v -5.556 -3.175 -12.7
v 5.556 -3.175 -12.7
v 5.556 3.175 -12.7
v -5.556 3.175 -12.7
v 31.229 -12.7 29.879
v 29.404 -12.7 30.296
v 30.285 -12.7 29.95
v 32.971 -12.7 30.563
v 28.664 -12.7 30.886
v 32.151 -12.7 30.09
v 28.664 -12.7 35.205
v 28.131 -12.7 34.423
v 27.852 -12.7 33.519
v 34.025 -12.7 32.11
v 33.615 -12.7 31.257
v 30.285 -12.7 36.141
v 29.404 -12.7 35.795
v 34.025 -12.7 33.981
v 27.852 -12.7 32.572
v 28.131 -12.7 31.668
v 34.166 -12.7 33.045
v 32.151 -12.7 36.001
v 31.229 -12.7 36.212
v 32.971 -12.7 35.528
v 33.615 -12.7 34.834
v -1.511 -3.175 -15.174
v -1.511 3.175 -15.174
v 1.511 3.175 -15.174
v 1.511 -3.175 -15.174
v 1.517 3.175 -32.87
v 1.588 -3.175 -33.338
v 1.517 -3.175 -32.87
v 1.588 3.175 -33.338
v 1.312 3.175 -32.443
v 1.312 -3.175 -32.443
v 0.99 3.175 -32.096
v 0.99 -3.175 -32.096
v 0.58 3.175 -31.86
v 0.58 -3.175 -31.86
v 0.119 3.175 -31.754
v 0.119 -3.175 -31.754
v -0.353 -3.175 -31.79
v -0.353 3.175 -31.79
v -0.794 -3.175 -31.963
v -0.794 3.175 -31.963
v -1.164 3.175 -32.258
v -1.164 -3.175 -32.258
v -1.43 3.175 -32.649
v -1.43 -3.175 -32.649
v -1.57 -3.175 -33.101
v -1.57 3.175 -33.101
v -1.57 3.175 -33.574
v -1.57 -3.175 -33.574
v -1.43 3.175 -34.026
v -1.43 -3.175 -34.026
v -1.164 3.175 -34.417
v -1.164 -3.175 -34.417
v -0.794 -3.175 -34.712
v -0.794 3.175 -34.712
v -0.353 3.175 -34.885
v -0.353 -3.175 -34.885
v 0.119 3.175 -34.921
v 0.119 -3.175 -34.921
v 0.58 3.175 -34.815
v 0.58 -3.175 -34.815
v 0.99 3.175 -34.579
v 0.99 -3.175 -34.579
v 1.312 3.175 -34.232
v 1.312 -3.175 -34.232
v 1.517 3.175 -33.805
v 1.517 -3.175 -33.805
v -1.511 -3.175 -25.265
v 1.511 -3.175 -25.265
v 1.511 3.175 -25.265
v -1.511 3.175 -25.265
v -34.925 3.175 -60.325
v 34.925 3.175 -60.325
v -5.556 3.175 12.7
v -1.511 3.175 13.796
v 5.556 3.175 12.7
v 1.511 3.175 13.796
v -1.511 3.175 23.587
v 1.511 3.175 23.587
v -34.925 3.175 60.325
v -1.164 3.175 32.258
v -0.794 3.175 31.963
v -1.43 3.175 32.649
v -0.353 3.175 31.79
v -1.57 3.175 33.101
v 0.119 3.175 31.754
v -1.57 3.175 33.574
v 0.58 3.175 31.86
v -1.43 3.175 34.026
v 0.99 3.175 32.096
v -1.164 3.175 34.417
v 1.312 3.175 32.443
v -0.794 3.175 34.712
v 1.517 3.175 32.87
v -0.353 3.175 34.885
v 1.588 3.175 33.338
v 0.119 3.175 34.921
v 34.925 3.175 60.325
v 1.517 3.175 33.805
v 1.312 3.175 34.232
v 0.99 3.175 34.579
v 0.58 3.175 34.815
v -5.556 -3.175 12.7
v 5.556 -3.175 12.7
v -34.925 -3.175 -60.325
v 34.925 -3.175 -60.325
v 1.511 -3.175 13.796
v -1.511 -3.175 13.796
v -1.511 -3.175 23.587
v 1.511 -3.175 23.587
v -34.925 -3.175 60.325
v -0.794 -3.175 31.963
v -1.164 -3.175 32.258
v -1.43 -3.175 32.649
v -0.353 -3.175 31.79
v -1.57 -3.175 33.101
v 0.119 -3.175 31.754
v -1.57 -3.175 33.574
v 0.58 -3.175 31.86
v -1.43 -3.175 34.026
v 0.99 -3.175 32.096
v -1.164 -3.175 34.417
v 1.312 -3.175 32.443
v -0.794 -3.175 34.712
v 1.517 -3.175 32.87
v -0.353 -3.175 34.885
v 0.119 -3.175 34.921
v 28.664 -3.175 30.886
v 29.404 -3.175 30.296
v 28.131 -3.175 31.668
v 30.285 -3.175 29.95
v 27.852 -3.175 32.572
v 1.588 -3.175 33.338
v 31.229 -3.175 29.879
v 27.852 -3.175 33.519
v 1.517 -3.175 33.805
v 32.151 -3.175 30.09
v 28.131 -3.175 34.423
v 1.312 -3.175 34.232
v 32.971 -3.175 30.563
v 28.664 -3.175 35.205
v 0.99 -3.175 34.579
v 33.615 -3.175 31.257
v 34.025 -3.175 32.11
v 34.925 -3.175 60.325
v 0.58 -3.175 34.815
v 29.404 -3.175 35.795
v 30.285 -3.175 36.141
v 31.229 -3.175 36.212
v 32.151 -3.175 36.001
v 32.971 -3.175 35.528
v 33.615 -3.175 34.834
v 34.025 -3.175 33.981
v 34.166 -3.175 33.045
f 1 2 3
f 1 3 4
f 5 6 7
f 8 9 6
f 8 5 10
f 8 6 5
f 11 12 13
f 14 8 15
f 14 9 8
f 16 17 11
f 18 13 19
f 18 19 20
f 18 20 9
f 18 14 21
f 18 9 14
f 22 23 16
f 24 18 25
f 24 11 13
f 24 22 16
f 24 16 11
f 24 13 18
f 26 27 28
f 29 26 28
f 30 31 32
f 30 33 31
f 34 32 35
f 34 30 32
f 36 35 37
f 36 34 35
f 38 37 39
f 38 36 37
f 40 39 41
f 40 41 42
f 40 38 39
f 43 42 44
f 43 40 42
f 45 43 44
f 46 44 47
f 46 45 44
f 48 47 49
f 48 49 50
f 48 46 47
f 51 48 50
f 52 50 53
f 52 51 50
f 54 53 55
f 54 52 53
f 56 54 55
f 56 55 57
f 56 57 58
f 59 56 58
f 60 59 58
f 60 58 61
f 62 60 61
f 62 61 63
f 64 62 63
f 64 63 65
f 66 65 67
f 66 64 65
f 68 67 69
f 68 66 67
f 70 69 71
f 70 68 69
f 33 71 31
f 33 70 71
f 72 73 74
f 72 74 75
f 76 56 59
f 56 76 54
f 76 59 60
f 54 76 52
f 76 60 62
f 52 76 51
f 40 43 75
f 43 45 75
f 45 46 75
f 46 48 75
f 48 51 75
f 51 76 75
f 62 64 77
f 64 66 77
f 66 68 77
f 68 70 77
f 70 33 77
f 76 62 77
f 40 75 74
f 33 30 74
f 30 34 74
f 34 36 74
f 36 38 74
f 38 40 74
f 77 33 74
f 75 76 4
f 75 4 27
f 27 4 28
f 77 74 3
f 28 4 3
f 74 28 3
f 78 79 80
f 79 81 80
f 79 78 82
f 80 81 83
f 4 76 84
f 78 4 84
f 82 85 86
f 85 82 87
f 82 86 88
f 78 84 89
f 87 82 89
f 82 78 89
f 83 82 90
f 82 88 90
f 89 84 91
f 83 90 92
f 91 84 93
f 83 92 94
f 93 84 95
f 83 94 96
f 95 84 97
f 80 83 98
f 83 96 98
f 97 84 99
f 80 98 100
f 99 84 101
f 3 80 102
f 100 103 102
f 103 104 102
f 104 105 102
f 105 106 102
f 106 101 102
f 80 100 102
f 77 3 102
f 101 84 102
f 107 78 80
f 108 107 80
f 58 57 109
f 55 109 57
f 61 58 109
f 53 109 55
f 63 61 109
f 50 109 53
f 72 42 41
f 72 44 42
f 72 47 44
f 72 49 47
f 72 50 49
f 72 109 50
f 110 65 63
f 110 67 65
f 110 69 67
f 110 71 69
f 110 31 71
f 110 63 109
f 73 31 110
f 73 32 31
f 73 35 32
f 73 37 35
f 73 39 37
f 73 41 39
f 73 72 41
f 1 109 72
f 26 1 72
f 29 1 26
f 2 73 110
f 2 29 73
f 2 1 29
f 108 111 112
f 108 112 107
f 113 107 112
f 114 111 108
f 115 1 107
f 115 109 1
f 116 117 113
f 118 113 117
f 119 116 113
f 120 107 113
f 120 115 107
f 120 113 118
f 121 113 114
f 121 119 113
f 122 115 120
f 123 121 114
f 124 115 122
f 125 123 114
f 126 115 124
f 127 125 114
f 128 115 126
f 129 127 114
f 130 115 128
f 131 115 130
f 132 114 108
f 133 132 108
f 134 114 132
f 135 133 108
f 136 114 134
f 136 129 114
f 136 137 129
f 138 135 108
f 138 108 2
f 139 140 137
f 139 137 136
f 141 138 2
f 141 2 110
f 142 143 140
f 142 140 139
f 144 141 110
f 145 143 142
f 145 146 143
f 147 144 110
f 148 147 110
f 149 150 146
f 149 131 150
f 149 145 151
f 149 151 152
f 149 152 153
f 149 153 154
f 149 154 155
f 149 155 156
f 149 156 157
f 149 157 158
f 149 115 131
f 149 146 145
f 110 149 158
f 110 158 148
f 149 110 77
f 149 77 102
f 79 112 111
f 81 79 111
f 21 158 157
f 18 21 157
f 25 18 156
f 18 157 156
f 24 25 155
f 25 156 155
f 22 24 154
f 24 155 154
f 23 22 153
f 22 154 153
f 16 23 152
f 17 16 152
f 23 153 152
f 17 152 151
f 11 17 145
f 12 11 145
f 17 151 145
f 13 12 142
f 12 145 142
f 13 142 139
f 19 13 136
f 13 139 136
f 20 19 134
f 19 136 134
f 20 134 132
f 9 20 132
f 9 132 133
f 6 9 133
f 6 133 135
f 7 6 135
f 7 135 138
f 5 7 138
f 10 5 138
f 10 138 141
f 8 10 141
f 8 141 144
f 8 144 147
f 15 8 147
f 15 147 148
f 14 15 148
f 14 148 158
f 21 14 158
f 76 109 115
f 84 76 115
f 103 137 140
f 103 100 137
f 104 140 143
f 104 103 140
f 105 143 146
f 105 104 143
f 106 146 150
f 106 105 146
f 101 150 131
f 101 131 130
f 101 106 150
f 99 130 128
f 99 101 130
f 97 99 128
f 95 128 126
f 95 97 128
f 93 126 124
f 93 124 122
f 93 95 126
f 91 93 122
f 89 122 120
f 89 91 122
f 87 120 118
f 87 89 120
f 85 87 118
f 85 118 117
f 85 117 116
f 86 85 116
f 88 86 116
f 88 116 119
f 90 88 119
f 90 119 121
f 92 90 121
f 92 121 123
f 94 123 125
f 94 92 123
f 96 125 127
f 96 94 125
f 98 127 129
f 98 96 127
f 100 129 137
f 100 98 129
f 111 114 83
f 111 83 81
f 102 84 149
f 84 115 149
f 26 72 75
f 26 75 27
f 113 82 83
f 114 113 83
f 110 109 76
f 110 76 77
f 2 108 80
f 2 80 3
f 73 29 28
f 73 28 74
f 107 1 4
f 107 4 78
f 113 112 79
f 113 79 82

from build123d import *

# Parameters (mm, degrees)
F0_R     = 3.175
F1_DEPTH = 12.7
F0_W     = 69.85
F0_H     = 120.65
F0_R_2   = 1.5875
F0_W_2   = 3.0226
F0_H_2   = 1.0957790866
F0_H_3   = 2.4735292748
F2_DEPTH = 3.175


# Not quite as in the source:
# - a feature names something its author has since deleted; it is built from what else it names


with BuildPart() as f1:
    # F0 (on Front) → F1 (new body)
    with BuildSketch(Plane.XZ):
        with Locations((30.9913528, 33.0454)):
            Circle(F0_R)
    extrude(amount=F1_DEPTH)

    # F0 (on Front) → F2 (join, symmetric)
    with BuildSketch(Plane.XZ):
        Rectangle(F0_W, F0_H)
        with Locations((0, -33.3375)):
            Circle(F0_R_2, mode=Mode.SUBTRACT)
        Polygon((1.5113, 12.7), (5.55625, 12.7), (5.55625, -12.7), (1.5113, -12.7), (1.5113, -15.1735292748), (1.5113, -25.2650182862), (-1.5113, -25.2650182862), (-1.5113, -15.1735292748), (-1.5113, -12.7), (-5.55625, -12.7), (-5.55625, 12.7), (-1.5113, 12.7), (-1.5113, 13.7957790866), (-1.5113, 23.5874790866), (1.5113, 23.5874790866), (1.5113, 13.7957790866), align=None, mode=Mode.SUBTRACT)
        with Locations((0, 33.3375)):
            Circle(F0_R_2, mode=Mode.SUBTRACT)
        with Locations((30.9913528, 33.0454)):
            Circle(F0_R, mode=Mode.SUBTRACT)
        with Locations((0, 13.2478895433)):
            Rectangle(F0_W_2, F0_H_2)
        with Locations((30.9913528, 33.0454)):
            Circle(F0_R)
        with Locations((0, -13.9367646374)):
            Rectangle(F0_W_2, F0_H_3)
    extrude(amount=F2_DEPTH, both=True)


solid = f1.part
